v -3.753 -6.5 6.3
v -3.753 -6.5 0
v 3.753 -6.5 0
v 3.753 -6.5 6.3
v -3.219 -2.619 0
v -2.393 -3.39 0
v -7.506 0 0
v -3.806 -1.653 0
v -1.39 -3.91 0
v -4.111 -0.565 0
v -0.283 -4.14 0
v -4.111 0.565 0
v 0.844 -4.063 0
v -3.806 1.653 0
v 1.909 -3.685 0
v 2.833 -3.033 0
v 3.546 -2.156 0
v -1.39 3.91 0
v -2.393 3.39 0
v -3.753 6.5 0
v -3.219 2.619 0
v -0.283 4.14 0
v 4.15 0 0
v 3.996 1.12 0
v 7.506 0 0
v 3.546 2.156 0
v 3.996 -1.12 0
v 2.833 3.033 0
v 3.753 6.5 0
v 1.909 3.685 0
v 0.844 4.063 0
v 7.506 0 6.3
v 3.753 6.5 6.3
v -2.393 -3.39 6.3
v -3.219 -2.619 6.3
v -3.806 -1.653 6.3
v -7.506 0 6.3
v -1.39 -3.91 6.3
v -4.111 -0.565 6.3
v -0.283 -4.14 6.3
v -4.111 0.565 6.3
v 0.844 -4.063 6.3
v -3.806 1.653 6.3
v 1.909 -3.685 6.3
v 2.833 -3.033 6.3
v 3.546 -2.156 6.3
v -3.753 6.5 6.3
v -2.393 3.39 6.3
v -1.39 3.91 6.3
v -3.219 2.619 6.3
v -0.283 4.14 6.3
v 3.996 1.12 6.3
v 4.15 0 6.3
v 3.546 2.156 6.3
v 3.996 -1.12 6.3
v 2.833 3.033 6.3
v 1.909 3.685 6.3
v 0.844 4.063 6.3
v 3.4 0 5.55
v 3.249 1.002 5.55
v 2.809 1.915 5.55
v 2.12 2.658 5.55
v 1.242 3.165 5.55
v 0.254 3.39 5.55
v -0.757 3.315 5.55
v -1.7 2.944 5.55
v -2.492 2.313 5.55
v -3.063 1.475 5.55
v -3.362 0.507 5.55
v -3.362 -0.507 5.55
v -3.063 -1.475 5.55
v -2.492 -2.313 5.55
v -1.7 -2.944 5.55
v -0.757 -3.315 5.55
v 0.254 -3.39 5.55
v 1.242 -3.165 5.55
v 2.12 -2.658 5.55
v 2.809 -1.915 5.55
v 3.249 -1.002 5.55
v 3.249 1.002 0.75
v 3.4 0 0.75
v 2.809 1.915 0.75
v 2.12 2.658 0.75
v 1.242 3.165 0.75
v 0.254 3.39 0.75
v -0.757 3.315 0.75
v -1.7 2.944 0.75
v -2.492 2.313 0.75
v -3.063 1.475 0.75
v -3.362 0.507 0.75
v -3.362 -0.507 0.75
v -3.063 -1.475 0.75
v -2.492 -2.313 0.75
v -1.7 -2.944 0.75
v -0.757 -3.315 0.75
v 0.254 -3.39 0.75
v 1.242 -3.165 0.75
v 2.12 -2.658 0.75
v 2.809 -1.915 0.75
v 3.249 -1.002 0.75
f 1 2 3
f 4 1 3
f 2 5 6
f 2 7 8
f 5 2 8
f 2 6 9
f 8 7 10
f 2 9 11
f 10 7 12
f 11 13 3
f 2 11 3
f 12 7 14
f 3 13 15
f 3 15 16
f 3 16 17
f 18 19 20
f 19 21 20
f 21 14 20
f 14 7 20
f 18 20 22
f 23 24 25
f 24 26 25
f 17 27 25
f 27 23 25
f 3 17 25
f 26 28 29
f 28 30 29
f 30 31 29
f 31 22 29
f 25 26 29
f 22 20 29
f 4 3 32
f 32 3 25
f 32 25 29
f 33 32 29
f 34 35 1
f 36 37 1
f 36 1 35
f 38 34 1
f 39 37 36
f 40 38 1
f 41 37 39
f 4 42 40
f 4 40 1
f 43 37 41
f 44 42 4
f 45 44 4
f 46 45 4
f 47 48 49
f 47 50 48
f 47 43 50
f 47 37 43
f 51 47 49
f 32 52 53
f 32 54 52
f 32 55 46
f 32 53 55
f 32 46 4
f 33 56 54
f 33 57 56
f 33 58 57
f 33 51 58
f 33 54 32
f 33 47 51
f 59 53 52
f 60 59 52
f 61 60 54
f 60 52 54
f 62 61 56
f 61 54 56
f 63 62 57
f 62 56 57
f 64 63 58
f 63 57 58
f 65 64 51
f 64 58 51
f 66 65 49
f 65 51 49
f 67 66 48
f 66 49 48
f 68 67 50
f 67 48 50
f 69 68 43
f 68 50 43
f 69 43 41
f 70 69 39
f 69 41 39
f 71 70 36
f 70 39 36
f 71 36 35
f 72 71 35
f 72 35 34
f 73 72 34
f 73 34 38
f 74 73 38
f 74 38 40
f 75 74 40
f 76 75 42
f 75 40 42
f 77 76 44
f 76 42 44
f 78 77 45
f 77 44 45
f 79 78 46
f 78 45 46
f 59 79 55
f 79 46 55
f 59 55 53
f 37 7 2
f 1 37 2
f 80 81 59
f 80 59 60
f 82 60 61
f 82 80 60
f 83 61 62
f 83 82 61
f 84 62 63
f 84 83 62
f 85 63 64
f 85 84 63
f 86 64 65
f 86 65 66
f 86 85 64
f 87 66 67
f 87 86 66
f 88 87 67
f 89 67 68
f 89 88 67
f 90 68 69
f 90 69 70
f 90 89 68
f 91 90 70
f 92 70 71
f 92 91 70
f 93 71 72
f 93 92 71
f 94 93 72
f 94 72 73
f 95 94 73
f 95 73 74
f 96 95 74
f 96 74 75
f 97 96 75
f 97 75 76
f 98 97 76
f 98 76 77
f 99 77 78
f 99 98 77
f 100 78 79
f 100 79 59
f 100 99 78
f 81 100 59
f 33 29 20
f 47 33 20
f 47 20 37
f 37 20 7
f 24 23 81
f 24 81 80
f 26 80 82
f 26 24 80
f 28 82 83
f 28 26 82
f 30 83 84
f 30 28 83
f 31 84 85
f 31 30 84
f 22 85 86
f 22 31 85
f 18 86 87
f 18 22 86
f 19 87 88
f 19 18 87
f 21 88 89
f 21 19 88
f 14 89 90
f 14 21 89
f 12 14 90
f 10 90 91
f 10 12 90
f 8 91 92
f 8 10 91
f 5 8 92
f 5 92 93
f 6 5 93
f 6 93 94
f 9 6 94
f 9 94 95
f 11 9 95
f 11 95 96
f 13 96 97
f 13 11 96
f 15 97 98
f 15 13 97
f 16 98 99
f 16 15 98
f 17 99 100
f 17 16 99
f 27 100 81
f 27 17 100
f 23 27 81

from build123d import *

# Parameters (mm, degrees)
SKETCH1_R           = 3.4
BOSS_EXTRUDE1_DEPTH = 6.3
CHAMFER1_SIZE       = 0.75


with BuildPart() as part:
    # Sketch1 → Boss-Extrude1 (new body)
    with BuildSketch(Plane.XY):
        Polygon((7.505553499, 0), (3.75277675, 6.5), (-3.75277675, 6.5), (-7.505553499, 0), (-3.75277675, -6.5), (3.75277675, -6.5), align=None)
        Circle(SKETCH1_R, mode=Mode.SUBTRACT)
    extrude(amount=BOSS_EXTRUDE1_DEPTH)

    # Chamfer1
    chamfer1_edges = [part.edges().sort_by_distance(p)[0] for p in [
        (-3.4, 0, 0),
        (-3.4, 0, 6.3),
    ]]
    chamfer(chamfer1_edges, length=CHAMFER1_SIZE)


solid = part.part
